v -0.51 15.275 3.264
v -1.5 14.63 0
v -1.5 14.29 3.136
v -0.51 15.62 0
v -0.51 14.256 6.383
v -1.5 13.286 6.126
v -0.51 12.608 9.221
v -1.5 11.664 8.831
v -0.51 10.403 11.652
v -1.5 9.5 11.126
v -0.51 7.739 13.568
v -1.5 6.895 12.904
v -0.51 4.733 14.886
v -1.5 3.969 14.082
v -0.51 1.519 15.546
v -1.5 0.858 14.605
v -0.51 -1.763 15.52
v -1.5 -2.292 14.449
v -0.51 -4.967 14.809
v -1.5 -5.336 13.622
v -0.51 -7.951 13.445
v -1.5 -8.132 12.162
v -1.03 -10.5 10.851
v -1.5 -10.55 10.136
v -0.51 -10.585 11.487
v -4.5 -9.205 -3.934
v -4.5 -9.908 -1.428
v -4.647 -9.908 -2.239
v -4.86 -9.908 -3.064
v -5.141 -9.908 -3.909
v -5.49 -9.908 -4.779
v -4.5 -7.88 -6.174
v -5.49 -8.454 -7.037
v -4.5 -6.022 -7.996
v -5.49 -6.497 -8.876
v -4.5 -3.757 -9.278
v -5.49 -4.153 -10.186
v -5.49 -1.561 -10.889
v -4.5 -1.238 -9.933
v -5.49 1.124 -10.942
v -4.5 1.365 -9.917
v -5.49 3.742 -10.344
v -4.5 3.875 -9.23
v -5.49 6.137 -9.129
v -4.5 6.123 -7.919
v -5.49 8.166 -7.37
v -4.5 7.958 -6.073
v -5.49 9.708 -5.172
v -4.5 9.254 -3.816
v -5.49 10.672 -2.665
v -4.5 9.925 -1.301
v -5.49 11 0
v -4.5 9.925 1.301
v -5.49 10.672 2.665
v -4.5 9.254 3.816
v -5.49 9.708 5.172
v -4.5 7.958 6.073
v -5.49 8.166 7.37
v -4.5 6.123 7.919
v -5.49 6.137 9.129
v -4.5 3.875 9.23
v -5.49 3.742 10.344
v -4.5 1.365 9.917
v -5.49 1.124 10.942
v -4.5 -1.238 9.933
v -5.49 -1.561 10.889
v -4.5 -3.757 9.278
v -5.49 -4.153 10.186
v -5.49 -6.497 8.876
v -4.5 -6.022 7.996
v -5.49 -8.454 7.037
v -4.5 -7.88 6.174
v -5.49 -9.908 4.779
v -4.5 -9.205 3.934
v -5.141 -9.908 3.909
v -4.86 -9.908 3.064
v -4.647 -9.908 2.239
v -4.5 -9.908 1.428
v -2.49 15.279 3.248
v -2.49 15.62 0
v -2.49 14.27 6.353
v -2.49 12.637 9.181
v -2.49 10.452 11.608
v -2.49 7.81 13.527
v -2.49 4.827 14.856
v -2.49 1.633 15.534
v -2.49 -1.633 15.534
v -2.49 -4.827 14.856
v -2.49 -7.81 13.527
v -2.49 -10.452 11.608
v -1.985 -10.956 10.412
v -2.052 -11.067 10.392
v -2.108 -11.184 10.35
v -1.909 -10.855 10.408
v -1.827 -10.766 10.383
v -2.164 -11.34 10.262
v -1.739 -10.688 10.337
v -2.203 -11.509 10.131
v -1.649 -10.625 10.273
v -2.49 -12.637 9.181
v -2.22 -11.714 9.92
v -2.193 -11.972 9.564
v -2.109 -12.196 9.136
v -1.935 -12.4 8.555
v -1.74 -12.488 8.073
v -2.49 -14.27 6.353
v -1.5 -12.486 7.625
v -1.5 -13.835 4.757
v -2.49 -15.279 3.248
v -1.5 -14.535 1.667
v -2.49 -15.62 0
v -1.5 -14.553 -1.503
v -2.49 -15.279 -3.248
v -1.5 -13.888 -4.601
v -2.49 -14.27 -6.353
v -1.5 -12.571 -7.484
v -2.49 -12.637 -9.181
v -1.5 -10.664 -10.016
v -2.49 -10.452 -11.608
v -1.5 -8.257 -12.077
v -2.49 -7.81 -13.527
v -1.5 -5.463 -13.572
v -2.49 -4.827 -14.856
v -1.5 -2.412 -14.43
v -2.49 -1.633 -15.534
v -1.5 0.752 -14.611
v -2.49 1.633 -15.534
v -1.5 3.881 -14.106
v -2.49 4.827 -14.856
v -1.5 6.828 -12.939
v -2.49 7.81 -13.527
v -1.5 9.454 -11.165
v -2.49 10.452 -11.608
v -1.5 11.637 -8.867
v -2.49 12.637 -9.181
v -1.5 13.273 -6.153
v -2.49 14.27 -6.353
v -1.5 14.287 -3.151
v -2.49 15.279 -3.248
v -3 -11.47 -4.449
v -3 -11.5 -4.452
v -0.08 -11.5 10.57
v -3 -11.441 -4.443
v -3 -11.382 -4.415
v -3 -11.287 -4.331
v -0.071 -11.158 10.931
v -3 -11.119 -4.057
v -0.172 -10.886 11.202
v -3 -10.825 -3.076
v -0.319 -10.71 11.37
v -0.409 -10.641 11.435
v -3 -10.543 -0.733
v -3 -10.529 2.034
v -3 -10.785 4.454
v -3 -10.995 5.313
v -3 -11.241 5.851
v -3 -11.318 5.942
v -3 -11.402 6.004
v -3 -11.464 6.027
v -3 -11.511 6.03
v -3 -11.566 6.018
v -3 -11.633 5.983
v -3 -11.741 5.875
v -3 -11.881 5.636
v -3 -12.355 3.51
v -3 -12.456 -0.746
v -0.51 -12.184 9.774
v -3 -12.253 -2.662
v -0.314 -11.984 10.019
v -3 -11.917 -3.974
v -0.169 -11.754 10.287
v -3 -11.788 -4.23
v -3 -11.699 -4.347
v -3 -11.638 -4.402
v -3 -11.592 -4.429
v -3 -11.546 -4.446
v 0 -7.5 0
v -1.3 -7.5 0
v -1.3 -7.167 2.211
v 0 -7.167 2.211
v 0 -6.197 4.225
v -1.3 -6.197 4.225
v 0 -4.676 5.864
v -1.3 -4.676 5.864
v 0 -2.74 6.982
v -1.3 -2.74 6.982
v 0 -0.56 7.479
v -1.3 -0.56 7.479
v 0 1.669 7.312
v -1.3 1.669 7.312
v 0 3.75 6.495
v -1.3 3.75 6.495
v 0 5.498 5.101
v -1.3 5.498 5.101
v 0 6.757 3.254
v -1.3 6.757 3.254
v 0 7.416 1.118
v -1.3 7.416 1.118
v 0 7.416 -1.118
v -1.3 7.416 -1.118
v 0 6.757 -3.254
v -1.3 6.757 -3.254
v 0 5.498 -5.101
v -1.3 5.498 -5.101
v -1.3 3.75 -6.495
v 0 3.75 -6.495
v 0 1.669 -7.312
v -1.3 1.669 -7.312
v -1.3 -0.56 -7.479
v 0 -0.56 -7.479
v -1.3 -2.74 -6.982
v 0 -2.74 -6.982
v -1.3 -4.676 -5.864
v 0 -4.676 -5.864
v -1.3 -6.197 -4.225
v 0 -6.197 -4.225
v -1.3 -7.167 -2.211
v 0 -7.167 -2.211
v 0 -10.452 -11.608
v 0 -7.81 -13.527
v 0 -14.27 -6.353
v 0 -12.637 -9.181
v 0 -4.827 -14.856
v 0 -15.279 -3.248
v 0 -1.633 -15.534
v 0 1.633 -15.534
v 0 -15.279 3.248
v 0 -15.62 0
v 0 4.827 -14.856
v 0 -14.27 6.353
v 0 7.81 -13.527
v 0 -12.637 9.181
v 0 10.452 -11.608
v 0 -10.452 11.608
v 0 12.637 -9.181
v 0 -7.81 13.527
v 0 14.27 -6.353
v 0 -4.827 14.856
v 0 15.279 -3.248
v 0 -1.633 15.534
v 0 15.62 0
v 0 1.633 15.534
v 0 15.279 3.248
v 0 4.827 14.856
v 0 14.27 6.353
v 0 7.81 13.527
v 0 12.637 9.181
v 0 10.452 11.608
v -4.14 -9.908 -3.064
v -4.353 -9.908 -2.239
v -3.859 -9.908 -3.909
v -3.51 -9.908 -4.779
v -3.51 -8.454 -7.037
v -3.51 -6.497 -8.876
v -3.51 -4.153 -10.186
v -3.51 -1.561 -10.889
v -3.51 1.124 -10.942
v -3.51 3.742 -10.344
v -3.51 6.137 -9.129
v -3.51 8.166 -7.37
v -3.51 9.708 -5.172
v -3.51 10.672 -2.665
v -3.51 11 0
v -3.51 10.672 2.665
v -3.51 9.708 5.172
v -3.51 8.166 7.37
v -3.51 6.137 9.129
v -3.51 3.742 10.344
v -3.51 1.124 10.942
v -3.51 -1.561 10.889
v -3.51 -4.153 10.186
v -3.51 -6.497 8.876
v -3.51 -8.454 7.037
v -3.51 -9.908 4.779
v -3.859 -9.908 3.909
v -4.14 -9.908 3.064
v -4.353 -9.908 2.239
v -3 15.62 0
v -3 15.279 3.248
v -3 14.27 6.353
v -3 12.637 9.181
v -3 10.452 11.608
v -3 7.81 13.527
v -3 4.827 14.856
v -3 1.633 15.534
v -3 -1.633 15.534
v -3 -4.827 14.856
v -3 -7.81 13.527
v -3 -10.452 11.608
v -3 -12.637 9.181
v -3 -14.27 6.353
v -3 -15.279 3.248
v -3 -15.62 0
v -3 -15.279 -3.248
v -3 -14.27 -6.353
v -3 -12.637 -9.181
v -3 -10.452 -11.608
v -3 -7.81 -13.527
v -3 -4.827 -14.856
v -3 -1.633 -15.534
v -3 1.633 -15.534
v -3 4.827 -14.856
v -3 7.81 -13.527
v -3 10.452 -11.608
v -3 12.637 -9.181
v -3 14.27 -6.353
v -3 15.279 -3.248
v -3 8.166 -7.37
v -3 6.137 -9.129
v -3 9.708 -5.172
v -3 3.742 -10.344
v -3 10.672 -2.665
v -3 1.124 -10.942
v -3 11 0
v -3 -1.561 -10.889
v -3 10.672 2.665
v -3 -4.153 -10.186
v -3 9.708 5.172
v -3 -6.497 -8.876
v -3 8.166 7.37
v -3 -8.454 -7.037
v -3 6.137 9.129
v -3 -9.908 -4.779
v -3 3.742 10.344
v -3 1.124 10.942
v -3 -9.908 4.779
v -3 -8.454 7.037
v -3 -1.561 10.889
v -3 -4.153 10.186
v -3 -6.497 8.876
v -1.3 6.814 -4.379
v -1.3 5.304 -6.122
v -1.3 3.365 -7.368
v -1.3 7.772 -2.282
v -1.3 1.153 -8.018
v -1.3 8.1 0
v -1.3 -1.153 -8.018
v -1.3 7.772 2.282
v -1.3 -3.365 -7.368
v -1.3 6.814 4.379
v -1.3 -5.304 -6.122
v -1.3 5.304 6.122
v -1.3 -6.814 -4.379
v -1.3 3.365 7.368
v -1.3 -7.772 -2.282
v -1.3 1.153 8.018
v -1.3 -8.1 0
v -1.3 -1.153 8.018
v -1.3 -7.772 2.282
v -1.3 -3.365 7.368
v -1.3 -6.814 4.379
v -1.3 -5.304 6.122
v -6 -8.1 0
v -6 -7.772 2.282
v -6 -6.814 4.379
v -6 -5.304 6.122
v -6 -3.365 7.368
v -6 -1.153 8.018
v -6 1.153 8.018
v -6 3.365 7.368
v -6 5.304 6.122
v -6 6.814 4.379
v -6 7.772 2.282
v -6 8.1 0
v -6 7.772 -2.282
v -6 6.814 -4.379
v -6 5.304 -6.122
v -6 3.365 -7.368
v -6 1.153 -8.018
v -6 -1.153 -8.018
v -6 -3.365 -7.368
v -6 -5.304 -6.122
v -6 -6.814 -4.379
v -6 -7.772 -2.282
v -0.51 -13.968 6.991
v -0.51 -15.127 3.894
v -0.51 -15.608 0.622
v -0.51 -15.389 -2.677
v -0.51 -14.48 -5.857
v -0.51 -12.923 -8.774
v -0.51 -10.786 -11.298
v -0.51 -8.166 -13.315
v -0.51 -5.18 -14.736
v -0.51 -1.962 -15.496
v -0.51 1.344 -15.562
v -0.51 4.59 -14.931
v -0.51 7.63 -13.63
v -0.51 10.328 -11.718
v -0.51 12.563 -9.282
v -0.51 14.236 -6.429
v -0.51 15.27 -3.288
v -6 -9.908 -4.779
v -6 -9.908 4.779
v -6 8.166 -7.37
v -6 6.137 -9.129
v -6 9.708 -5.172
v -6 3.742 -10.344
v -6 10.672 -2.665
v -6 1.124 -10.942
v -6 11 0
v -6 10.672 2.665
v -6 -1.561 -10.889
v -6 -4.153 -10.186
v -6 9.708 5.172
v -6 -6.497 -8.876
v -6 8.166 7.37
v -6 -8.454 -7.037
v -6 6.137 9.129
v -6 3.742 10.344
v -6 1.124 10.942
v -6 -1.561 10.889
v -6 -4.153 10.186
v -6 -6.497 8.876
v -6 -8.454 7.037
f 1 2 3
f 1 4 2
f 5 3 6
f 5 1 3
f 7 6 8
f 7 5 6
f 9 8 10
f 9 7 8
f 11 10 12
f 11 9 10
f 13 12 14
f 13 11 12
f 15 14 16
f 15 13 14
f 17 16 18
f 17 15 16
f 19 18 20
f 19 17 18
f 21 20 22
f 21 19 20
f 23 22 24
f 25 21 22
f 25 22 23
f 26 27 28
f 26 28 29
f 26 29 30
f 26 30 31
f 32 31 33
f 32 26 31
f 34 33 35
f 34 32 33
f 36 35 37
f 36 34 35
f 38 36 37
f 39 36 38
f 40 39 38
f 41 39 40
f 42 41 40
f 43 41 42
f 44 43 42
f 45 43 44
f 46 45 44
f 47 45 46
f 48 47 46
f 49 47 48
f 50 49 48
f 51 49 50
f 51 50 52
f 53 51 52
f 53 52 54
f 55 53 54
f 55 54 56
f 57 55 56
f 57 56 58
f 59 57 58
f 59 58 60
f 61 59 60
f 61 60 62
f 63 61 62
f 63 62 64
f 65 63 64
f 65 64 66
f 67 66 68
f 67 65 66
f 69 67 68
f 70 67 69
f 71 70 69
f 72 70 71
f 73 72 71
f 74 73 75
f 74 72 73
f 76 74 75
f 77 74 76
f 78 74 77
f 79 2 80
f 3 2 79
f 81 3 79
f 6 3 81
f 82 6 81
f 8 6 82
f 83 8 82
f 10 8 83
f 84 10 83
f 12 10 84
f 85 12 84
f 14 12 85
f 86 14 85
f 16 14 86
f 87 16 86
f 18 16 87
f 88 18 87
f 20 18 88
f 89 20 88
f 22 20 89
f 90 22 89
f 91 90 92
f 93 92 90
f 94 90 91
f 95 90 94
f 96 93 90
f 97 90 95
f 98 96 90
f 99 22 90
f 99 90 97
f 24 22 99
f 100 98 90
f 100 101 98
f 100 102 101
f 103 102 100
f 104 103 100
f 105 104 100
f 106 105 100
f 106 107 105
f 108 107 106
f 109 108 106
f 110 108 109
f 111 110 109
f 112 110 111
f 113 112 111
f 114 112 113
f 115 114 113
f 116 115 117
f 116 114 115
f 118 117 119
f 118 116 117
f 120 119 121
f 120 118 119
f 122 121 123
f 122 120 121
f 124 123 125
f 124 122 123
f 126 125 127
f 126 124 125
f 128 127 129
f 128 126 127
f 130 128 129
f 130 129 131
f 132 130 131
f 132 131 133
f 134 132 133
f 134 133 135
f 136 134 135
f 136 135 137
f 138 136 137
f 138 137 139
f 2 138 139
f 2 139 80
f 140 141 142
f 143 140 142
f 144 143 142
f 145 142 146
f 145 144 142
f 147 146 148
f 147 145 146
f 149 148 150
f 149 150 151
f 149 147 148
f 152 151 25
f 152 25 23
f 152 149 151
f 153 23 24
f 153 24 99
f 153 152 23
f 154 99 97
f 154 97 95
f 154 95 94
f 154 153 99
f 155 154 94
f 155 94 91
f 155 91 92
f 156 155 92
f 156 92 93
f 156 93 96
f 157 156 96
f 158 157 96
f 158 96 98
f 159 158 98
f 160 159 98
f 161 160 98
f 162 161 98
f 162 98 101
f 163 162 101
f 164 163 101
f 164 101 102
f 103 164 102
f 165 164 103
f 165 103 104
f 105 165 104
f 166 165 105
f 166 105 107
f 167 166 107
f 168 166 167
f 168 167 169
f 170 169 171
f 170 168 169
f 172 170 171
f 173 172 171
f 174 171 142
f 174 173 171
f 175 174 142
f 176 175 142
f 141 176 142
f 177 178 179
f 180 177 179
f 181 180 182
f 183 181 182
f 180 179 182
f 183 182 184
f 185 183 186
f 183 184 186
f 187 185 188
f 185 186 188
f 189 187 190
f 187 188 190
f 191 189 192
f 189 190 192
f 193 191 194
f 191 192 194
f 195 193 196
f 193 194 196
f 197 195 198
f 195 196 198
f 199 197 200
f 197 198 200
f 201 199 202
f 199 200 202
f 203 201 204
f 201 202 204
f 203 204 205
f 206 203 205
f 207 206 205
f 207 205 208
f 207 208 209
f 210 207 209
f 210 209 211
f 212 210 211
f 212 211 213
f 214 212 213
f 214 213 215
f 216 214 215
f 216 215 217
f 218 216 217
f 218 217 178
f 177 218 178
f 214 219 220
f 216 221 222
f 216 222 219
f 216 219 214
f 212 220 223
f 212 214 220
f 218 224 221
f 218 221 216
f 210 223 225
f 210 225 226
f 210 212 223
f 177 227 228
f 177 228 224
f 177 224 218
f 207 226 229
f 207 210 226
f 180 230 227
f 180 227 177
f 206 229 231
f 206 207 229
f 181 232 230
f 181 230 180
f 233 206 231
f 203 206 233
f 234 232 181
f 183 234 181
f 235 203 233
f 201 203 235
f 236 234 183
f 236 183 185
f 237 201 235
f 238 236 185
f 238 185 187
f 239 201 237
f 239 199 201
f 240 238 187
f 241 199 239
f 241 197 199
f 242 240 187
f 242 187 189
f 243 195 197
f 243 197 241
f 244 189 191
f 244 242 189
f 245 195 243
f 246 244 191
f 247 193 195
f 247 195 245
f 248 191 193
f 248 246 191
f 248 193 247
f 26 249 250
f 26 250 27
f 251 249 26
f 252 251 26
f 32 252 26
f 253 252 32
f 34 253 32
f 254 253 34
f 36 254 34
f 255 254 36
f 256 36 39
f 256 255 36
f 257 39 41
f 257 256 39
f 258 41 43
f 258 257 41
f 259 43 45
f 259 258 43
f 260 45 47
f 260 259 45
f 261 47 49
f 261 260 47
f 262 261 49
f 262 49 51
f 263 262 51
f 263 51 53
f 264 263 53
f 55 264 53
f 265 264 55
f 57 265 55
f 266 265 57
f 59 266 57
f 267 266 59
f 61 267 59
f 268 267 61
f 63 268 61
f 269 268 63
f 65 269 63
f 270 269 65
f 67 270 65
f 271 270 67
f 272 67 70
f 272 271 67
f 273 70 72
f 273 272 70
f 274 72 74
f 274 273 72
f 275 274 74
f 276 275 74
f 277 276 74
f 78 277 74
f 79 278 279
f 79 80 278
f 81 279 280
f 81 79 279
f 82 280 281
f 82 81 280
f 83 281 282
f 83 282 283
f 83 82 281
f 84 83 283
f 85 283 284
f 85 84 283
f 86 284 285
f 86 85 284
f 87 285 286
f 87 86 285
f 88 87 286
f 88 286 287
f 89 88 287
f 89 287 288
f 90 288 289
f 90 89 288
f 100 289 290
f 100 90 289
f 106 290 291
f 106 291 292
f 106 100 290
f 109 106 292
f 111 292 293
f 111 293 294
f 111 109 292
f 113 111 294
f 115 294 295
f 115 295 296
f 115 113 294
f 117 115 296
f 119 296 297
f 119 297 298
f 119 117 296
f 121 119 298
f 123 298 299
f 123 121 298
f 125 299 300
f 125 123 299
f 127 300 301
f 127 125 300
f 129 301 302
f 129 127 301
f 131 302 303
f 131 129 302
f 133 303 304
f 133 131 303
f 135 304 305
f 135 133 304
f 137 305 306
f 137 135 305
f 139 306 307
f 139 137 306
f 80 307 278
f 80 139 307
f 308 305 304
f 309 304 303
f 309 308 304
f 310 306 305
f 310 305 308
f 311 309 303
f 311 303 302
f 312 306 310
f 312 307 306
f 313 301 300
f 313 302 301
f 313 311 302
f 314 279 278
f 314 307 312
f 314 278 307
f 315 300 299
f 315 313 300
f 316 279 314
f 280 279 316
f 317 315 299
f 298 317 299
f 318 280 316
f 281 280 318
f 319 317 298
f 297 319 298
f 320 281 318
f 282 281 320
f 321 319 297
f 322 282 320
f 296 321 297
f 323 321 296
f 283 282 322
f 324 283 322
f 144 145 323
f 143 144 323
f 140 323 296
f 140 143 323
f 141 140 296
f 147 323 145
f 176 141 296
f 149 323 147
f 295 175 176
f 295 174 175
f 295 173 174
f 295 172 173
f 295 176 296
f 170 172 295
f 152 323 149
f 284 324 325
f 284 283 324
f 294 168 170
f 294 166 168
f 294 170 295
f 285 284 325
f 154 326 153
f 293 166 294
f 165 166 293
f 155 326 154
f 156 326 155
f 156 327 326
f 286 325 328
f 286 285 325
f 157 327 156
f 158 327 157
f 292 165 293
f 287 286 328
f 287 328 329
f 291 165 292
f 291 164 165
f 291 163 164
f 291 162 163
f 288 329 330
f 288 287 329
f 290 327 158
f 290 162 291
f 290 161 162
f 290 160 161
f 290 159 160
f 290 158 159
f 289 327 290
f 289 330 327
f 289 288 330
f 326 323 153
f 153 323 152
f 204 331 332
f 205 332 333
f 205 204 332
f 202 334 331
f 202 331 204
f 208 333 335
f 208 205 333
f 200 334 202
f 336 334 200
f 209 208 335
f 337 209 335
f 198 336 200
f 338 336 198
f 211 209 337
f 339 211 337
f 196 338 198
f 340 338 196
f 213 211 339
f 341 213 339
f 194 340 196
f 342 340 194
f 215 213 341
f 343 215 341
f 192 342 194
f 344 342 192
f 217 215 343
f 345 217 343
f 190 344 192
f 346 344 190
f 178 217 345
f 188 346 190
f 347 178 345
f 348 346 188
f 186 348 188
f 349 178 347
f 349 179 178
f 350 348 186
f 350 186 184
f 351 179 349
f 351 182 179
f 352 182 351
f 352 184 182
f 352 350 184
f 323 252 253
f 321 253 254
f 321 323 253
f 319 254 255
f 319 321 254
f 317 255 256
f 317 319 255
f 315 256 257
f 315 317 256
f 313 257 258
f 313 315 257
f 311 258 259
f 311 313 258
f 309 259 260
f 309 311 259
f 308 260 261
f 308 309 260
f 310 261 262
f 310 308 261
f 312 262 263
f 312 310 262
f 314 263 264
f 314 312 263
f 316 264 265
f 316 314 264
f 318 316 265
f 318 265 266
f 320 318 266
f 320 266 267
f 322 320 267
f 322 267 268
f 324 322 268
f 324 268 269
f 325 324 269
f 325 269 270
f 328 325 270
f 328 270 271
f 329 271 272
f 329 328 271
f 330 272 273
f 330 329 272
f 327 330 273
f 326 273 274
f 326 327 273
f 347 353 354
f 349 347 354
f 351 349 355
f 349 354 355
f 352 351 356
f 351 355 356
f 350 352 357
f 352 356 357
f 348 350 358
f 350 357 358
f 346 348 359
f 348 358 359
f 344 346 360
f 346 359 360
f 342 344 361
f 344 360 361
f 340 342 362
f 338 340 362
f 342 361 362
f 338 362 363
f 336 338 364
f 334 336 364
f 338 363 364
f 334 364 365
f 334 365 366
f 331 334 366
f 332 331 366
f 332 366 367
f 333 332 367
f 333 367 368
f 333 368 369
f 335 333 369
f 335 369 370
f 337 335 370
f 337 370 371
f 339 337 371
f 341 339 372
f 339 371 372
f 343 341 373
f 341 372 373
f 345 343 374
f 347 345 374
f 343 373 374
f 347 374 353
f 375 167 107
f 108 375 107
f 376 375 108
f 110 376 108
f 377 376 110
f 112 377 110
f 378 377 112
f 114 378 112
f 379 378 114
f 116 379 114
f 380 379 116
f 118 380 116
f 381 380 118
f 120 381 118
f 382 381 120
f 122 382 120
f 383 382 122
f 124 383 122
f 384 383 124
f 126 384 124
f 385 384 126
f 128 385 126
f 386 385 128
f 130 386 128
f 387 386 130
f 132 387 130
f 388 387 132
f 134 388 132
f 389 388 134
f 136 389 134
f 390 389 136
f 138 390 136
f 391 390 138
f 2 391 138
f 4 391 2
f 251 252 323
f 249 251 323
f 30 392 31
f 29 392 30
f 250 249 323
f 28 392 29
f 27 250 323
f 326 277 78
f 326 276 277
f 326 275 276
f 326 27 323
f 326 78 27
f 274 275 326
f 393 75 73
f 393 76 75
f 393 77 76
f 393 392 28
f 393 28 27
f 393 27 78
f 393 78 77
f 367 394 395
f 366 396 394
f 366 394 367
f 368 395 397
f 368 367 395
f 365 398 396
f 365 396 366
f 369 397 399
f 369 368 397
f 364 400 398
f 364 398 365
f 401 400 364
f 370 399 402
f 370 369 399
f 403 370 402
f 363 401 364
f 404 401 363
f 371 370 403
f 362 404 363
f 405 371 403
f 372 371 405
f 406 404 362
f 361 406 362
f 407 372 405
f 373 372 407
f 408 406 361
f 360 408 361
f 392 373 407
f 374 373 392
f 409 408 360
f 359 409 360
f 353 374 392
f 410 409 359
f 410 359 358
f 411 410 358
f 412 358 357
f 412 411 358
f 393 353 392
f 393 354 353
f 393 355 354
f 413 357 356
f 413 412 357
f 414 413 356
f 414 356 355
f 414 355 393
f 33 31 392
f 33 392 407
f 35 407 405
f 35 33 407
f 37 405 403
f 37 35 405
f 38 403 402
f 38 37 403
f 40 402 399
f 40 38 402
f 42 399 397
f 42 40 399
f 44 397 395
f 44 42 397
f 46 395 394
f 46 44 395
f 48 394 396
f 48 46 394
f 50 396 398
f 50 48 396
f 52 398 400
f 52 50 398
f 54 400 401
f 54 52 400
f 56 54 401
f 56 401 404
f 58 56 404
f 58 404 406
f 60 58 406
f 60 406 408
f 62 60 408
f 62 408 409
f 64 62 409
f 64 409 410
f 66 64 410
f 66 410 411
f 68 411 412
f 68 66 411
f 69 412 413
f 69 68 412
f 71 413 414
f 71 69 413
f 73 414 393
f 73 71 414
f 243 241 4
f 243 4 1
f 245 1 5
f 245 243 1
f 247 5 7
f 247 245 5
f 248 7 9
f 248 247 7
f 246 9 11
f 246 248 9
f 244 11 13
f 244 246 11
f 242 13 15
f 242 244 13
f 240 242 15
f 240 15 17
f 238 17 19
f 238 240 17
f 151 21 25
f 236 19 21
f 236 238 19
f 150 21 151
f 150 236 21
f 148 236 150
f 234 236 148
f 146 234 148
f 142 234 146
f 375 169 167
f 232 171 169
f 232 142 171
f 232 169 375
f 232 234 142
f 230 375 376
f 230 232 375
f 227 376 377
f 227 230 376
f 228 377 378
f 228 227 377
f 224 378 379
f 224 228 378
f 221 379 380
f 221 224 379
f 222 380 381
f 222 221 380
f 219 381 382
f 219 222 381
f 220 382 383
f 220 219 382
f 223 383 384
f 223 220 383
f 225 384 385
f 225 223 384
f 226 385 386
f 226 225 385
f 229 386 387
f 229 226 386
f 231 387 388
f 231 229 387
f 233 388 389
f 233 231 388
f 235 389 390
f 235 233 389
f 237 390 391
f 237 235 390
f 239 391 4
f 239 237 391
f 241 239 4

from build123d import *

# Parameters (mm, degrees)
CYLINDER_R           = 1
CYLINDER_DEPTH       = 26
CYLINDER_PITCH_ANGLE = 11
SKETCH001_W          = 1.861037
SKETCH001_H          = 10.545838
POCKET_DEPTH         = 3
SKETCH002_R          = 8.1
POCKET001_DEPTH      = 4.7
SKETCH003_R          = 7.5
POCKET002_DEPTH      = 5


with BuildPart() as cylinder:
    # Cylinder → Cylinder (new body)
    with BuildSketch(Plane.XY):
        Circle(CYLINDER_R)
    extrude(amount=CYLINDER_DEPTH)


with BuildPart() as cylinder_1:
    # Cylinder pitch: moved
    add(cylinder.part.rotate(Axis((0, 0, 0), (0, 1, 0)), CYLINDER_PITCH_ANGLE))


with BuildPart() as cylinder_2:
    # Cylinder placement: moved
    add(cylinder_1.part.moved(Location((-5, -11.5, -9.5))))


with BuildPart() as cut:
    # Sketch → Revolution (revolve)
    with BuildSketch(Plane.XY):
        Polygon((-6, 0), (-6, 11), (-5.489949, 11), (-4.5, 10.010051), (-3.510051, 11), (-3, 11), (-3, 15.62), (-2.489949, 15.62), (-1.5, 14.630051), (-0.510051, 15.62), (0, 15.62), (0, 0), align=None)
    revolve(axis=Axis((0, 0, 0), (1, 0, 0)))

    # Sketch001 → Pocket (cut)
    with BuildSketch(Plane(origin=(-6, 0, 0), x_dir=(0, -1, 0), z_dir=(-1, 0, 0))):
        with Locations((10.838202, -0.192388)):
            Rectangle(SKETCH001_W, SKETCH001_H)
    extrude(amount=-POCKET_DEPTH, mode=Mode.SUBTRACT)

    # Sketch002 → Pocket001 (cut)
    with BuildSketch(Plane(origin=(-6, 0, 0), x_dir=(0, -1, 0), z_dir=(-1, 0, 0))):
        Circle(SKETCH002_R)
    extrude(amount=-POCKET001_DEPTH, mode=Mode.SUBTRACT)

    # Sketch003 → Pocket002 (cut)
    with BuildSketch(Plane(origin=(-1.3, 0, 0), x_dir=(0, -1, 0), z_dir=(-1, 0, 0))):
        Circle(SKETCH003_R)
    extrude(amount=-POCKET002_DEPTH, mode=Mode.SUBTRACT)

    # Cut: cut Cylinder
    add(cylinder_2.part, mode=Mode.SUBTRACT)


solid = cut.part
